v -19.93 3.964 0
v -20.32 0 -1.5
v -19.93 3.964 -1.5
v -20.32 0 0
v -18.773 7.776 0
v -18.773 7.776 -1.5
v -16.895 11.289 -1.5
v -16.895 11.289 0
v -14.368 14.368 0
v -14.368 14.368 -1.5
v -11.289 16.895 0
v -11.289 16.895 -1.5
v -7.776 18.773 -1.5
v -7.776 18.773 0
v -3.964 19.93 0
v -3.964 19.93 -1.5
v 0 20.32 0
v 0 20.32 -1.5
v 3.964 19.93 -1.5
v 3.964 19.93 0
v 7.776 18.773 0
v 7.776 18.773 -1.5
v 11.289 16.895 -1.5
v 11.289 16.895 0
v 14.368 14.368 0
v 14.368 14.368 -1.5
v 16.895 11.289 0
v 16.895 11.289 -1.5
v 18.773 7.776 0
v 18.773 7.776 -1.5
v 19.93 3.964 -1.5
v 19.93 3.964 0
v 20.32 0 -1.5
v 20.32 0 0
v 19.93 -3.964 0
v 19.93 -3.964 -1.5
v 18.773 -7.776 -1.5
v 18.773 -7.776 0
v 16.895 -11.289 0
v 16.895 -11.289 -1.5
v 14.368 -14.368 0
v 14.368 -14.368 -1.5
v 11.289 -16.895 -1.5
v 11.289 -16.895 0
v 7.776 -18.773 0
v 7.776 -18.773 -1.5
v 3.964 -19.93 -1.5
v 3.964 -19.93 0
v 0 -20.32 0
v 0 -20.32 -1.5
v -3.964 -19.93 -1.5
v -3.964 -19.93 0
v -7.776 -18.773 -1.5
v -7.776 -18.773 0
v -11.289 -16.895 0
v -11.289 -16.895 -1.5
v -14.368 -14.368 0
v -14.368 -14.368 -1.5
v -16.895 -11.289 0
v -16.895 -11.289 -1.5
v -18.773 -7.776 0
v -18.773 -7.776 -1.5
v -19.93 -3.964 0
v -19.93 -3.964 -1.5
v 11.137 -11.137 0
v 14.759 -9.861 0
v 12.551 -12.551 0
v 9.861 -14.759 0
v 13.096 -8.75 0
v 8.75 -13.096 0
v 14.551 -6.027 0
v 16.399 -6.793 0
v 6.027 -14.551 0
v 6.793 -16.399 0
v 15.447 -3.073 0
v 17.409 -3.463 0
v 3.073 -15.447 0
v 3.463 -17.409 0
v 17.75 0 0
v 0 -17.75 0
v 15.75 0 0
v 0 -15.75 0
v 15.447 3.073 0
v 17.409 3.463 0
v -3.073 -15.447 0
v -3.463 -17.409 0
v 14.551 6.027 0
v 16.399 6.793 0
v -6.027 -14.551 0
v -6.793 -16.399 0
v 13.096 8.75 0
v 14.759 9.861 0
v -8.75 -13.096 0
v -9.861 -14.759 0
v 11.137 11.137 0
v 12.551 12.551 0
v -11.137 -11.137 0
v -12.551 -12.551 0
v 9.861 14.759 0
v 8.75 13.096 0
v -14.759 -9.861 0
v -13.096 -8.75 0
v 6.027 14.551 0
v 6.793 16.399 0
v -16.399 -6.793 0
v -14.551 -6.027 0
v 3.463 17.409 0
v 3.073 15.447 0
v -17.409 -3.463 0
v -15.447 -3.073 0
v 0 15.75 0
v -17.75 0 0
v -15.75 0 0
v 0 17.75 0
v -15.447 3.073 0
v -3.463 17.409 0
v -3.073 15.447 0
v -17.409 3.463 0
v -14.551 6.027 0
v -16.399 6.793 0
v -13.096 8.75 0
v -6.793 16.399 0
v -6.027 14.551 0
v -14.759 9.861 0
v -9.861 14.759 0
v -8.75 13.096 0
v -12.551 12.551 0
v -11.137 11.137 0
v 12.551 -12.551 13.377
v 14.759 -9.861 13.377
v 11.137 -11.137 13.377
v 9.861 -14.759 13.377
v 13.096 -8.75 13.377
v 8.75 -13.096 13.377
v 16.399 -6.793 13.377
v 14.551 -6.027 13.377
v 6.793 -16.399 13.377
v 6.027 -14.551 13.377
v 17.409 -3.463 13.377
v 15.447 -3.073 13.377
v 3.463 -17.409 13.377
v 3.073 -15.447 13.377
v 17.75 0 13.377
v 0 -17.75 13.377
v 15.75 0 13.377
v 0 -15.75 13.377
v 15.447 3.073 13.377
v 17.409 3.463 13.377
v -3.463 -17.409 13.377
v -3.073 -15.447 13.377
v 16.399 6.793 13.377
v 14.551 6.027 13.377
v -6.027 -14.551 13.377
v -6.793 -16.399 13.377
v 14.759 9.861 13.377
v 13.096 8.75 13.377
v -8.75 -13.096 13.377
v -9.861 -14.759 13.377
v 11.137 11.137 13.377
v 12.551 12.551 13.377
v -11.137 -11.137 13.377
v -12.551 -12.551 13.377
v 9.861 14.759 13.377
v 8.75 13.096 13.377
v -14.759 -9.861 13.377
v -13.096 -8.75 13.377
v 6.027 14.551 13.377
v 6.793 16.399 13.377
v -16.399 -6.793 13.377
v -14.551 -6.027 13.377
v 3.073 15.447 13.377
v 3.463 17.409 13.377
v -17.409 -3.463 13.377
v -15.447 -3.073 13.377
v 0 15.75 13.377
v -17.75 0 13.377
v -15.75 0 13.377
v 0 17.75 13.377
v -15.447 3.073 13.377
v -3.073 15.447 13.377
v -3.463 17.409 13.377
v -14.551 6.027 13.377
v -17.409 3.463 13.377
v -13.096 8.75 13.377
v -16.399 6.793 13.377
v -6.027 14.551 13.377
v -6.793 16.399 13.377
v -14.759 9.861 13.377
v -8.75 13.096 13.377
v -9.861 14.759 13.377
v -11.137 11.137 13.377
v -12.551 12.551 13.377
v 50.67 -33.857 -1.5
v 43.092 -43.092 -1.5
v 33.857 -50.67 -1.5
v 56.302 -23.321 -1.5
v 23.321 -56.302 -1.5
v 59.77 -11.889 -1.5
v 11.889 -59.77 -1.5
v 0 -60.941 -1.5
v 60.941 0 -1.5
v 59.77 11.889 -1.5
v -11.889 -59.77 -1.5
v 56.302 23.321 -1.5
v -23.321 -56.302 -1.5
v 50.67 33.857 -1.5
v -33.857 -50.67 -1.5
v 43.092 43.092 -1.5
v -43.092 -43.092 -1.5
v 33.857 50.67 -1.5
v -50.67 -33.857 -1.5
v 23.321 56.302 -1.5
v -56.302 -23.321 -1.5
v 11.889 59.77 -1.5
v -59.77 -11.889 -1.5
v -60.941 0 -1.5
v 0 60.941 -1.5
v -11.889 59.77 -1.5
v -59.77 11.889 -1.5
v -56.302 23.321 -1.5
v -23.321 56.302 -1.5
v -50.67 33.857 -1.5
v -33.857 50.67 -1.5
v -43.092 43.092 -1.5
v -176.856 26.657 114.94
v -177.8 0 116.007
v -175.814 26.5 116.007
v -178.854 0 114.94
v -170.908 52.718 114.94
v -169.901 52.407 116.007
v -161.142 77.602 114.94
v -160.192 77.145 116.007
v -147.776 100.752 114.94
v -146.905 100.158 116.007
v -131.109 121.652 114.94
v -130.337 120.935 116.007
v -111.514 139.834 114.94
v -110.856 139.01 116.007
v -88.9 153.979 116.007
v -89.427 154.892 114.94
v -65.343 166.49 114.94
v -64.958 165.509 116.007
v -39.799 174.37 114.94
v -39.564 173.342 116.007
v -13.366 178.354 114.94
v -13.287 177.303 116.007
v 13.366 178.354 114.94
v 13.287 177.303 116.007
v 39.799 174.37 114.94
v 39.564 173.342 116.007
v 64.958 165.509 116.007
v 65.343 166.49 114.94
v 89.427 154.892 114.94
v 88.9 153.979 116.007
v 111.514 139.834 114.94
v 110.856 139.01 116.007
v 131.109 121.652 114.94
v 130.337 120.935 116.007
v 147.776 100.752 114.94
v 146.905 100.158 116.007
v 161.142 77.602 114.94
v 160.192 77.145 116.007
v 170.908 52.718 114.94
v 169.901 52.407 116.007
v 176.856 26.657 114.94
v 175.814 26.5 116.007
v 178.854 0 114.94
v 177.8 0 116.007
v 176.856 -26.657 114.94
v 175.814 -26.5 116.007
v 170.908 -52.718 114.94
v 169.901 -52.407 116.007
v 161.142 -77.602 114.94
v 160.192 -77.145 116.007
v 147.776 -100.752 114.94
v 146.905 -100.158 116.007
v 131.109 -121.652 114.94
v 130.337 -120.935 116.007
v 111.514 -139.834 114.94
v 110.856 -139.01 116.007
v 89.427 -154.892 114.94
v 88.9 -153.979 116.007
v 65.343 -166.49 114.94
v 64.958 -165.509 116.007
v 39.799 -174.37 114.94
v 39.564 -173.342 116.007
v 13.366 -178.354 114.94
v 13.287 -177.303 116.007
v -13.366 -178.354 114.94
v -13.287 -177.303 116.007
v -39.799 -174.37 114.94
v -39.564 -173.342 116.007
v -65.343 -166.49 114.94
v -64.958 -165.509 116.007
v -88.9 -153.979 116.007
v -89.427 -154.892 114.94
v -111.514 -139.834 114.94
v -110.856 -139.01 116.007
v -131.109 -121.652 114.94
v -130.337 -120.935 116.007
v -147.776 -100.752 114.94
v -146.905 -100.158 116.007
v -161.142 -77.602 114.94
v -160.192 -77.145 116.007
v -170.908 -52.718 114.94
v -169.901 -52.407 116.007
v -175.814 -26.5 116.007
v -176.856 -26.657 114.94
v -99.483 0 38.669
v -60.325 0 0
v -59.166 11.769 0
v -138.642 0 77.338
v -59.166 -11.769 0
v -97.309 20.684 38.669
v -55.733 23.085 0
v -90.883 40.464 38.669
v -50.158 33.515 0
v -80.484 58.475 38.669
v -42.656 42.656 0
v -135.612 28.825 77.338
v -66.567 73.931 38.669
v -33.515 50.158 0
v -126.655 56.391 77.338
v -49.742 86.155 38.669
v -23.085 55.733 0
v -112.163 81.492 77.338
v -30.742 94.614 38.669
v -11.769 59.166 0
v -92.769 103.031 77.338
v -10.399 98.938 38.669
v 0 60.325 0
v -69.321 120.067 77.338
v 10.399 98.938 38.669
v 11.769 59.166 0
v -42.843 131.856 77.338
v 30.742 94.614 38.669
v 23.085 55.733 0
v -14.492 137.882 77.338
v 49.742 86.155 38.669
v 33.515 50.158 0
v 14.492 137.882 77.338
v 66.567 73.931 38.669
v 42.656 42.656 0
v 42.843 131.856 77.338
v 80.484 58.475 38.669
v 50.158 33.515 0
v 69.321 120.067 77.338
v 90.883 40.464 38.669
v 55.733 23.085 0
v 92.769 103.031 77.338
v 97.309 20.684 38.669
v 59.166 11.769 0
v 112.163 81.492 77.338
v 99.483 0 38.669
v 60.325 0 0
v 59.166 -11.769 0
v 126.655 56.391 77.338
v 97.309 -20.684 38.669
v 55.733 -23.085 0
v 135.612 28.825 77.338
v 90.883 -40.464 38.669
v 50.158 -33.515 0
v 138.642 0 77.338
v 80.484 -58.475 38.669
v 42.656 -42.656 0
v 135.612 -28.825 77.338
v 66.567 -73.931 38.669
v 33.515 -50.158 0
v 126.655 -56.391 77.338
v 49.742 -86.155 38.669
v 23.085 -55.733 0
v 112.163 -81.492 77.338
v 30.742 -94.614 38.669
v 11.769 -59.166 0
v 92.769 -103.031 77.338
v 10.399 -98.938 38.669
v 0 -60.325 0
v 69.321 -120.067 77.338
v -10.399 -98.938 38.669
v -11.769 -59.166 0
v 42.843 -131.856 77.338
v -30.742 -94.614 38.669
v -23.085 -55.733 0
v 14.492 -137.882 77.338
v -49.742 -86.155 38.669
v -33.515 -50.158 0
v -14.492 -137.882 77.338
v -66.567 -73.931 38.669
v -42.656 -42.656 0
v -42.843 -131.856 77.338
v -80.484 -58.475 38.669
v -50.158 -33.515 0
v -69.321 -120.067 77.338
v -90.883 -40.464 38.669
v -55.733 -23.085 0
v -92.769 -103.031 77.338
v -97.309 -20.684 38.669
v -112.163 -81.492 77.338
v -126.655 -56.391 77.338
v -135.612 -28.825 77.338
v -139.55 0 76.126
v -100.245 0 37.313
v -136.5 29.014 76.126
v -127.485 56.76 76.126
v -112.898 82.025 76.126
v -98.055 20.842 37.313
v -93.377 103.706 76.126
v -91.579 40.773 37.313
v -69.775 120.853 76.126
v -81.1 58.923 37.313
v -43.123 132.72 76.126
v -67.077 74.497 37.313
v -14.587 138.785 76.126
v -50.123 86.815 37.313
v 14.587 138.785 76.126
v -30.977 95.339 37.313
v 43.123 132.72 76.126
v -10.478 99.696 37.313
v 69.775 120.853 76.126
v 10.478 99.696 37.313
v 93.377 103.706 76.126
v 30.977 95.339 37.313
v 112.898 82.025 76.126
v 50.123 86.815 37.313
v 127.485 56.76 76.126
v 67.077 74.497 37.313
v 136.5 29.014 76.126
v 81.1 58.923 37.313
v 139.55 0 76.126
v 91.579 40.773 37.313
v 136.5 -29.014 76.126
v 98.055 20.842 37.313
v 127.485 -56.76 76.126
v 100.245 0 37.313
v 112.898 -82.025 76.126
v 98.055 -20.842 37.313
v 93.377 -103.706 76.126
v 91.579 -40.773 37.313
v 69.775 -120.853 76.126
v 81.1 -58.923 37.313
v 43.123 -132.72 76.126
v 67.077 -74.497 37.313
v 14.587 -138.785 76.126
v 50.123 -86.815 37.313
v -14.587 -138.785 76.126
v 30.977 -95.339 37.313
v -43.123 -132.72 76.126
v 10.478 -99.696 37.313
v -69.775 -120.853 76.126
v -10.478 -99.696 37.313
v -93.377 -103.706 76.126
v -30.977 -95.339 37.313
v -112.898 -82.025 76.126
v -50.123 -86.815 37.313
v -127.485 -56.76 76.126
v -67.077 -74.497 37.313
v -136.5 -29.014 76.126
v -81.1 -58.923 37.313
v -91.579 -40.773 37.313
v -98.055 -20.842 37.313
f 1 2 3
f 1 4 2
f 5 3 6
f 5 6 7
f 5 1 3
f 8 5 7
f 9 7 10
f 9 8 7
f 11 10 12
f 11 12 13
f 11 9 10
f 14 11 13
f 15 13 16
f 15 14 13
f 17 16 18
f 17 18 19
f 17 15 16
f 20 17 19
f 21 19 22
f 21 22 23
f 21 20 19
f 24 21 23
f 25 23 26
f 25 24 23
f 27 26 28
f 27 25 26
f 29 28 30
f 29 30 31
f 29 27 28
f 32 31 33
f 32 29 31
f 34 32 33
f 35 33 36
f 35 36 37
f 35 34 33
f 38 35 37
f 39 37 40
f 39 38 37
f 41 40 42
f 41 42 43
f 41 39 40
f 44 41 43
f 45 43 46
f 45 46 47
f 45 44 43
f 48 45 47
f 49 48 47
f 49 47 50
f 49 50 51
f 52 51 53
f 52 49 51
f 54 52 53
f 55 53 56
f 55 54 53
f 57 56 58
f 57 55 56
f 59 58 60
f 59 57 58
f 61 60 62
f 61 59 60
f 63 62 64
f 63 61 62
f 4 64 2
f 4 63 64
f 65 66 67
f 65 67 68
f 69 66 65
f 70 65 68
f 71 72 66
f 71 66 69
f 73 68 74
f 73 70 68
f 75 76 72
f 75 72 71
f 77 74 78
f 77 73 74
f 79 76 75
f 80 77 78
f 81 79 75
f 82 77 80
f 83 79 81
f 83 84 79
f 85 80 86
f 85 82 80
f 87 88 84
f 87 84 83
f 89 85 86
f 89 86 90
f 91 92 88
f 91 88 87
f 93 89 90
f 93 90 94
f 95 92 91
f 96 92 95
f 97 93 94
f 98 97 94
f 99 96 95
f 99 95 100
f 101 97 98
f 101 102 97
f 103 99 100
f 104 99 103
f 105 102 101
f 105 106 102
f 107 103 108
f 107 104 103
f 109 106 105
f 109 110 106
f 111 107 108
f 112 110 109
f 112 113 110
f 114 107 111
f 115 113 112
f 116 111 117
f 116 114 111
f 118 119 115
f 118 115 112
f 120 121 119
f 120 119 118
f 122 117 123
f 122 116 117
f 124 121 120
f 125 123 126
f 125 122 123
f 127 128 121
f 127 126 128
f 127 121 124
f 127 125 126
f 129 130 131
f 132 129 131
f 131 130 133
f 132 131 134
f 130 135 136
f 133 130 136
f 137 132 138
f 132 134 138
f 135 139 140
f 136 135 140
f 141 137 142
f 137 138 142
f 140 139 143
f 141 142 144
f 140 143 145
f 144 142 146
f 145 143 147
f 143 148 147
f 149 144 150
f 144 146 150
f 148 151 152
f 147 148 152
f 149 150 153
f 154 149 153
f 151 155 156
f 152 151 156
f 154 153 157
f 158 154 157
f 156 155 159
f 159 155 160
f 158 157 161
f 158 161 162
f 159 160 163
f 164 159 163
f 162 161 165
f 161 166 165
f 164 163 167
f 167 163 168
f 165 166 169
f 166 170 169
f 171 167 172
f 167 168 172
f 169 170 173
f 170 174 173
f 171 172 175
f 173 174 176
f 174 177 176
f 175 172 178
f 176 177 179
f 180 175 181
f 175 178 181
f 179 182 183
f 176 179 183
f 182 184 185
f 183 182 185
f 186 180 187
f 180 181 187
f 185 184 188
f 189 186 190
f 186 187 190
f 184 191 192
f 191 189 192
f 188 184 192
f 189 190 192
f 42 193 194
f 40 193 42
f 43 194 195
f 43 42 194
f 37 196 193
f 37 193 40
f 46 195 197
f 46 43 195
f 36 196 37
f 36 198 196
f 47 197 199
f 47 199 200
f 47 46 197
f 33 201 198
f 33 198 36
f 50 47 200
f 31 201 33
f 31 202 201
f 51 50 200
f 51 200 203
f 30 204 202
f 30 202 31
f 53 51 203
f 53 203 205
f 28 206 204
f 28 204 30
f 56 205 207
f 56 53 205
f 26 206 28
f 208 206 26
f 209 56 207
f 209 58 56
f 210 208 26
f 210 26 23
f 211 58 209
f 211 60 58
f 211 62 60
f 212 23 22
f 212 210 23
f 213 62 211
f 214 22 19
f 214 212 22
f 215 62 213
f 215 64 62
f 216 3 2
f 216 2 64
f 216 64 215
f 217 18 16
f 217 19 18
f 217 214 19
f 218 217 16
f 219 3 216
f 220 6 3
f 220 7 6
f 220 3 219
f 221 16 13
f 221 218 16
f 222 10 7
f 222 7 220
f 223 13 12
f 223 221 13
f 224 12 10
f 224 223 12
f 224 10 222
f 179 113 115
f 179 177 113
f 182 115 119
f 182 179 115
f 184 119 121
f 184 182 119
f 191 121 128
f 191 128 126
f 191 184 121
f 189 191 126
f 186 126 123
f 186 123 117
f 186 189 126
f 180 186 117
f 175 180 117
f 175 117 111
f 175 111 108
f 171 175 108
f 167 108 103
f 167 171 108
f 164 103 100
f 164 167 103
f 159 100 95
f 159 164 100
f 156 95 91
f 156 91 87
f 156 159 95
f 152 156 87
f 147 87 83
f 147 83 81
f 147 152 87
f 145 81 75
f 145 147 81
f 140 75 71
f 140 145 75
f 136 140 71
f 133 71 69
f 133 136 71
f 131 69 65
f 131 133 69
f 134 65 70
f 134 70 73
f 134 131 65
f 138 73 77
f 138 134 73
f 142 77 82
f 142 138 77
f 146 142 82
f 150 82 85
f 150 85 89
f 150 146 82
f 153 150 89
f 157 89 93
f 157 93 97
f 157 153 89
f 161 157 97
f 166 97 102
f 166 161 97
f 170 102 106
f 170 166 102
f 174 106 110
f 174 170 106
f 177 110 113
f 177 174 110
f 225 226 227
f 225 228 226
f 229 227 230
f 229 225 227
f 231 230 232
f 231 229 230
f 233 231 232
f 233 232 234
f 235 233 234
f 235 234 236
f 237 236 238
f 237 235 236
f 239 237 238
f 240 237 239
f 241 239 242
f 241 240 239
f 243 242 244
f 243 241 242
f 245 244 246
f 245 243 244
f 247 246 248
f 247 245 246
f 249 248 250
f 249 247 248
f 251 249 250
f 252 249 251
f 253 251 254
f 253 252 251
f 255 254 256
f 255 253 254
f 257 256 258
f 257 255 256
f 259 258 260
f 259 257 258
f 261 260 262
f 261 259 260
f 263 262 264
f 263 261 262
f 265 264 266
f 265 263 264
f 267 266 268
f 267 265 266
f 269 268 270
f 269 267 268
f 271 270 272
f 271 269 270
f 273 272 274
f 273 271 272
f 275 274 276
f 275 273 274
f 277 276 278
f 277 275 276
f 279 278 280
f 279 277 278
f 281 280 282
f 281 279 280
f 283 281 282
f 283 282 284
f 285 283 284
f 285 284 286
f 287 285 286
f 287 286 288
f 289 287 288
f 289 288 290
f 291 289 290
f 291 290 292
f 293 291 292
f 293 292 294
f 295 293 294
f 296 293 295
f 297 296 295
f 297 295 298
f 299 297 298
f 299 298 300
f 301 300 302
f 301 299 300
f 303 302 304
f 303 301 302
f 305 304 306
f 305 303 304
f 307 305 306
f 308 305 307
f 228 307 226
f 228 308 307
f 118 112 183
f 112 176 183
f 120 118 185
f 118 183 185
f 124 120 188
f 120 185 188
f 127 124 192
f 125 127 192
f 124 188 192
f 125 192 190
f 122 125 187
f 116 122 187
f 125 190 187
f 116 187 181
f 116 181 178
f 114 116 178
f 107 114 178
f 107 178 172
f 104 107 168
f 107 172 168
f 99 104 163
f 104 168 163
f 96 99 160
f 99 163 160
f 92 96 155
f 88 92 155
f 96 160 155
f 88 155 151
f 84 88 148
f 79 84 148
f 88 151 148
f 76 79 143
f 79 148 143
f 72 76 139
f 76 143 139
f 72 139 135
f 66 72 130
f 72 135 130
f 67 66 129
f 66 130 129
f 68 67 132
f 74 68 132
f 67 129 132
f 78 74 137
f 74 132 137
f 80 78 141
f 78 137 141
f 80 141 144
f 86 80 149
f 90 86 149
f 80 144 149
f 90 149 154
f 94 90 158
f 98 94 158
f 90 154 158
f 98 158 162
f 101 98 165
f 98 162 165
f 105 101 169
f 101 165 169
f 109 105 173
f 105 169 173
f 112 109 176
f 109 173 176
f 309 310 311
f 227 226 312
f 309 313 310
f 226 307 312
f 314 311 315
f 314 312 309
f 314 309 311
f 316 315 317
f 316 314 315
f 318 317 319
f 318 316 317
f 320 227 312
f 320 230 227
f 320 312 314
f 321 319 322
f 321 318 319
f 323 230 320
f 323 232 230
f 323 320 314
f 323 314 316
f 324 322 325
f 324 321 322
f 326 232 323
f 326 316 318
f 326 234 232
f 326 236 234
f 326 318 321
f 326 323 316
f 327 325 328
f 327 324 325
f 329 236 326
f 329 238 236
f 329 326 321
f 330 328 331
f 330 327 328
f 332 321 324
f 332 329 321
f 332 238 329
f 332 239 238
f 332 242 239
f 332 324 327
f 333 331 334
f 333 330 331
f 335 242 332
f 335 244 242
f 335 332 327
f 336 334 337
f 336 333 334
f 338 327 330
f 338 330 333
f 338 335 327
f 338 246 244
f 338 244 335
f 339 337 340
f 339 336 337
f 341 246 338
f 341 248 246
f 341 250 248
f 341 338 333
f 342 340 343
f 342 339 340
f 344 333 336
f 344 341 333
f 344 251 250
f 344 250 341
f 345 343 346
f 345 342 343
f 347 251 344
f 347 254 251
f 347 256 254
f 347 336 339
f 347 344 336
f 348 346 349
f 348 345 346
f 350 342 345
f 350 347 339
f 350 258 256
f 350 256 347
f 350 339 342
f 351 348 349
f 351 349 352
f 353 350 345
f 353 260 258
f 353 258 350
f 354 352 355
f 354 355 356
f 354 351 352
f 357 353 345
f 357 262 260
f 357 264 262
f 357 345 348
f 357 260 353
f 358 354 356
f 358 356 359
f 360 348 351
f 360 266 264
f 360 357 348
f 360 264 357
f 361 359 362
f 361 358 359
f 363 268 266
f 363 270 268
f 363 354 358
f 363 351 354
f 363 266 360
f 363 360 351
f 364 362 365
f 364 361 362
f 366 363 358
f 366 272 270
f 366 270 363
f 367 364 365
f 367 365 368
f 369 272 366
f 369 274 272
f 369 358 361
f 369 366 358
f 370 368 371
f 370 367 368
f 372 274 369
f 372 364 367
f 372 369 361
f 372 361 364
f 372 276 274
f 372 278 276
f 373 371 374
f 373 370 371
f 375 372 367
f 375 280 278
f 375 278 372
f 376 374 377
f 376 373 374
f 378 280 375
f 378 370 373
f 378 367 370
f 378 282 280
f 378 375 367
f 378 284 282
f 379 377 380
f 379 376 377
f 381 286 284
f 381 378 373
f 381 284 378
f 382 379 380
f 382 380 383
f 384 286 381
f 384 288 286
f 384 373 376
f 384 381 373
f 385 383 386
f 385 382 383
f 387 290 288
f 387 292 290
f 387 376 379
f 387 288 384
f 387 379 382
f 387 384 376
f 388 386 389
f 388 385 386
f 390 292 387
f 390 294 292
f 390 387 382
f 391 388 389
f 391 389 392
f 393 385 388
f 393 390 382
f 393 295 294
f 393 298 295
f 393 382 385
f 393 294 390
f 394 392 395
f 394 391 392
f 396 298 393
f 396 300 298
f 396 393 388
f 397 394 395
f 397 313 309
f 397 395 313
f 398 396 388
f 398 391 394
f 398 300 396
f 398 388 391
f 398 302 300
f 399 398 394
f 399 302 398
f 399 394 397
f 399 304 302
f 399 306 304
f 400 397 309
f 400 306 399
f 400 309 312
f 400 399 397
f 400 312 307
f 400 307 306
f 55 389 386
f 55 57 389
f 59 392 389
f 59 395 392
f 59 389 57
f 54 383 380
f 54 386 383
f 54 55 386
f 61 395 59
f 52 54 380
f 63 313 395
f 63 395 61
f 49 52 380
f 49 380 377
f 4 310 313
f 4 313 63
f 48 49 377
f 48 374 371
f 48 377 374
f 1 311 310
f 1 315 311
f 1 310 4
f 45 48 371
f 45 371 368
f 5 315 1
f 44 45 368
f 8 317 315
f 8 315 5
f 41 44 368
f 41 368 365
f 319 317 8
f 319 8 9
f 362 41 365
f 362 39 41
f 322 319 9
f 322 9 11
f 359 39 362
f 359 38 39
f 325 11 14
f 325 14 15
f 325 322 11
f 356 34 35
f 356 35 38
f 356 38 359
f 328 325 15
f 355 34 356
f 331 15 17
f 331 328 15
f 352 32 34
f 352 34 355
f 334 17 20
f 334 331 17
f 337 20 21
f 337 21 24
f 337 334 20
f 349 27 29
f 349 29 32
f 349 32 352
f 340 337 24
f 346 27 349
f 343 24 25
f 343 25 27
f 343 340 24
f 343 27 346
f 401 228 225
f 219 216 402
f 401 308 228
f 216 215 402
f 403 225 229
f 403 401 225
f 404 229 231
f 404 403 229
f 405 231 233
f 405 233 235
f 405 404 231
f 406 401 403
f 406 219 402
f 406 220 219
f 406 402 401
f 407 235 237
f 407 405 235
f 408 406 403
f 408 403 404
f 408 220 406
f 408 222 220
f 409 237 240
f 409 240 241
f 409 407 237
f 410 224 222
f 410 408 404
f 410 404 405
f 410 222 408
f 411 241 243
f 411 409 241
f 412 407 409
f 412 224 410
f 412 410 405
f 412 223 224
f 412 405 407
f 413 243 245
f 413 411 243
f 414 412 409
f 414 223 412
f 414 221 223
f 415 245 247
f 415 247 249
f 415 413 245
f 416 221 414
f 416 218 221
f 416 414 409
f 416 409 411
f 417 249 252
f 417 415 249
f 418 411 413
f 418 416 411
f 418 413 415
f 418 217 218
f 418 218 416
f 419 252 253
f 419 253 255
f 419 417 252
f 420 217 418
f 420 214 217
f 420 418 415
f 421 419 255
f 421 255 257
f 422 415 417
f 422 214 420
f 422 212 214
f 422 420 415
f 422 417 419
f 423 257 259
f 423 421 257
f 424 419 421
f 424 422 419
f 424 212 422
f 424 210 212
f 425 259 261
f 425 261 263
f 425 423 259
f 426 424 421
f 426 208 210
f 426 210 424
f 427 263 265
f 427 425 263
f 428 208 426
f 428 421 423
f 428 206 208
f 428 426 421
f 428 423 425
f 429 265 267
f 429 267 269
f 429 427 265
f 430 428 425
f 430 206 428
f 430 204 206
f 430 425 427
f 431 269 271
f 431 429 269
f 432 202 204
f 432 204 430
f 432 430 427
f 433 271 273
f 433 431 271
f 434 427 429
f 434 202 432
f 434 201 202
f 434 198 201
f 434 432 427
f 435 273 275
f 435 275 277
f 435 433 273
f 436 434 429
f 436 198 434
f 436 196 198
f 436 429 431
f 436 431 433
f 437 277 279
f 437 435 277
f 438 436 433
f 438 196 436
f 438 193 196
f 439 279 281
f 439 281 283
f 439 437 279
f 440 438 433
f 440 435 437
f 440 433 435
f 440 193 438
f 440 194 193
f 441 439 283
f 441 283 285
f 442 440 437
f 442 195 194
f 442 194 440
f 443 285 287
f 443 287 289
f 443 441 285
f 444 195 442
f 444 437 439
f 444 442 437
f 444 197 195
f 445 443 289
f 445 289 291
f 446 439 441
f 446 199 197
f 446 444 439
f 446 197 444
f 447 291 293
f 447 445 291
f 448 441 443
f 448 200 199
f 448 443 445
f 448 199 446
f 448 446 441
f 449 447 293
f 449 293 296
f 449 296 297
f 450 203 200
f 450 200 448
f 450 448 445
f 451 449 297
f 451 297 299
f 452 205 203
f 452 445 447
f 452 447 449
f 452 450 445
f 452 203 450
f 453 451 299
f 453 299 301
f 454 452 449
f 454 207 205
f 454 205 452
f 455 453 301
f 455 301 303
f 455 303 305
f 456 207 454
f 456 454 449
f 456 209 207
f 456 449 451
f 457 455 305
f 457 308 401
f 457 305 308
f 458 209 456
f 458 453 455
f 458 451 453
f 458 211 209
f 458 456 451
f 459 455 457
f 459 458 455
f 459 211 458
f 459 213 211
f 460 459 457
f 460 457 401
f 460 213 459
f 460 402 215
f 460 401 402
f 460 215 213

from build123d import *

# Parameters (mm, degrees)
F0_W = 2
F0_H = 13.376839


with BuildPart() as f1:
    # F0 (on Front) → F1 (revolve)
    with BuildSketch(Plane.XZ):
        Polygon((-20.32, 0), (-60.325, 0), (-177.8, 116.007045), (-178.853971, 114.939737), (-60.940803, -1.5), (-20.32, -1.5), align=None)
        with Locations((-16.75, 6.688419)):
            Rectangle(F0_W, F0_H)
    revolve(axis=Axis((0, 0, 58.003522), (0, 0, -1)))


solid = f1.part
